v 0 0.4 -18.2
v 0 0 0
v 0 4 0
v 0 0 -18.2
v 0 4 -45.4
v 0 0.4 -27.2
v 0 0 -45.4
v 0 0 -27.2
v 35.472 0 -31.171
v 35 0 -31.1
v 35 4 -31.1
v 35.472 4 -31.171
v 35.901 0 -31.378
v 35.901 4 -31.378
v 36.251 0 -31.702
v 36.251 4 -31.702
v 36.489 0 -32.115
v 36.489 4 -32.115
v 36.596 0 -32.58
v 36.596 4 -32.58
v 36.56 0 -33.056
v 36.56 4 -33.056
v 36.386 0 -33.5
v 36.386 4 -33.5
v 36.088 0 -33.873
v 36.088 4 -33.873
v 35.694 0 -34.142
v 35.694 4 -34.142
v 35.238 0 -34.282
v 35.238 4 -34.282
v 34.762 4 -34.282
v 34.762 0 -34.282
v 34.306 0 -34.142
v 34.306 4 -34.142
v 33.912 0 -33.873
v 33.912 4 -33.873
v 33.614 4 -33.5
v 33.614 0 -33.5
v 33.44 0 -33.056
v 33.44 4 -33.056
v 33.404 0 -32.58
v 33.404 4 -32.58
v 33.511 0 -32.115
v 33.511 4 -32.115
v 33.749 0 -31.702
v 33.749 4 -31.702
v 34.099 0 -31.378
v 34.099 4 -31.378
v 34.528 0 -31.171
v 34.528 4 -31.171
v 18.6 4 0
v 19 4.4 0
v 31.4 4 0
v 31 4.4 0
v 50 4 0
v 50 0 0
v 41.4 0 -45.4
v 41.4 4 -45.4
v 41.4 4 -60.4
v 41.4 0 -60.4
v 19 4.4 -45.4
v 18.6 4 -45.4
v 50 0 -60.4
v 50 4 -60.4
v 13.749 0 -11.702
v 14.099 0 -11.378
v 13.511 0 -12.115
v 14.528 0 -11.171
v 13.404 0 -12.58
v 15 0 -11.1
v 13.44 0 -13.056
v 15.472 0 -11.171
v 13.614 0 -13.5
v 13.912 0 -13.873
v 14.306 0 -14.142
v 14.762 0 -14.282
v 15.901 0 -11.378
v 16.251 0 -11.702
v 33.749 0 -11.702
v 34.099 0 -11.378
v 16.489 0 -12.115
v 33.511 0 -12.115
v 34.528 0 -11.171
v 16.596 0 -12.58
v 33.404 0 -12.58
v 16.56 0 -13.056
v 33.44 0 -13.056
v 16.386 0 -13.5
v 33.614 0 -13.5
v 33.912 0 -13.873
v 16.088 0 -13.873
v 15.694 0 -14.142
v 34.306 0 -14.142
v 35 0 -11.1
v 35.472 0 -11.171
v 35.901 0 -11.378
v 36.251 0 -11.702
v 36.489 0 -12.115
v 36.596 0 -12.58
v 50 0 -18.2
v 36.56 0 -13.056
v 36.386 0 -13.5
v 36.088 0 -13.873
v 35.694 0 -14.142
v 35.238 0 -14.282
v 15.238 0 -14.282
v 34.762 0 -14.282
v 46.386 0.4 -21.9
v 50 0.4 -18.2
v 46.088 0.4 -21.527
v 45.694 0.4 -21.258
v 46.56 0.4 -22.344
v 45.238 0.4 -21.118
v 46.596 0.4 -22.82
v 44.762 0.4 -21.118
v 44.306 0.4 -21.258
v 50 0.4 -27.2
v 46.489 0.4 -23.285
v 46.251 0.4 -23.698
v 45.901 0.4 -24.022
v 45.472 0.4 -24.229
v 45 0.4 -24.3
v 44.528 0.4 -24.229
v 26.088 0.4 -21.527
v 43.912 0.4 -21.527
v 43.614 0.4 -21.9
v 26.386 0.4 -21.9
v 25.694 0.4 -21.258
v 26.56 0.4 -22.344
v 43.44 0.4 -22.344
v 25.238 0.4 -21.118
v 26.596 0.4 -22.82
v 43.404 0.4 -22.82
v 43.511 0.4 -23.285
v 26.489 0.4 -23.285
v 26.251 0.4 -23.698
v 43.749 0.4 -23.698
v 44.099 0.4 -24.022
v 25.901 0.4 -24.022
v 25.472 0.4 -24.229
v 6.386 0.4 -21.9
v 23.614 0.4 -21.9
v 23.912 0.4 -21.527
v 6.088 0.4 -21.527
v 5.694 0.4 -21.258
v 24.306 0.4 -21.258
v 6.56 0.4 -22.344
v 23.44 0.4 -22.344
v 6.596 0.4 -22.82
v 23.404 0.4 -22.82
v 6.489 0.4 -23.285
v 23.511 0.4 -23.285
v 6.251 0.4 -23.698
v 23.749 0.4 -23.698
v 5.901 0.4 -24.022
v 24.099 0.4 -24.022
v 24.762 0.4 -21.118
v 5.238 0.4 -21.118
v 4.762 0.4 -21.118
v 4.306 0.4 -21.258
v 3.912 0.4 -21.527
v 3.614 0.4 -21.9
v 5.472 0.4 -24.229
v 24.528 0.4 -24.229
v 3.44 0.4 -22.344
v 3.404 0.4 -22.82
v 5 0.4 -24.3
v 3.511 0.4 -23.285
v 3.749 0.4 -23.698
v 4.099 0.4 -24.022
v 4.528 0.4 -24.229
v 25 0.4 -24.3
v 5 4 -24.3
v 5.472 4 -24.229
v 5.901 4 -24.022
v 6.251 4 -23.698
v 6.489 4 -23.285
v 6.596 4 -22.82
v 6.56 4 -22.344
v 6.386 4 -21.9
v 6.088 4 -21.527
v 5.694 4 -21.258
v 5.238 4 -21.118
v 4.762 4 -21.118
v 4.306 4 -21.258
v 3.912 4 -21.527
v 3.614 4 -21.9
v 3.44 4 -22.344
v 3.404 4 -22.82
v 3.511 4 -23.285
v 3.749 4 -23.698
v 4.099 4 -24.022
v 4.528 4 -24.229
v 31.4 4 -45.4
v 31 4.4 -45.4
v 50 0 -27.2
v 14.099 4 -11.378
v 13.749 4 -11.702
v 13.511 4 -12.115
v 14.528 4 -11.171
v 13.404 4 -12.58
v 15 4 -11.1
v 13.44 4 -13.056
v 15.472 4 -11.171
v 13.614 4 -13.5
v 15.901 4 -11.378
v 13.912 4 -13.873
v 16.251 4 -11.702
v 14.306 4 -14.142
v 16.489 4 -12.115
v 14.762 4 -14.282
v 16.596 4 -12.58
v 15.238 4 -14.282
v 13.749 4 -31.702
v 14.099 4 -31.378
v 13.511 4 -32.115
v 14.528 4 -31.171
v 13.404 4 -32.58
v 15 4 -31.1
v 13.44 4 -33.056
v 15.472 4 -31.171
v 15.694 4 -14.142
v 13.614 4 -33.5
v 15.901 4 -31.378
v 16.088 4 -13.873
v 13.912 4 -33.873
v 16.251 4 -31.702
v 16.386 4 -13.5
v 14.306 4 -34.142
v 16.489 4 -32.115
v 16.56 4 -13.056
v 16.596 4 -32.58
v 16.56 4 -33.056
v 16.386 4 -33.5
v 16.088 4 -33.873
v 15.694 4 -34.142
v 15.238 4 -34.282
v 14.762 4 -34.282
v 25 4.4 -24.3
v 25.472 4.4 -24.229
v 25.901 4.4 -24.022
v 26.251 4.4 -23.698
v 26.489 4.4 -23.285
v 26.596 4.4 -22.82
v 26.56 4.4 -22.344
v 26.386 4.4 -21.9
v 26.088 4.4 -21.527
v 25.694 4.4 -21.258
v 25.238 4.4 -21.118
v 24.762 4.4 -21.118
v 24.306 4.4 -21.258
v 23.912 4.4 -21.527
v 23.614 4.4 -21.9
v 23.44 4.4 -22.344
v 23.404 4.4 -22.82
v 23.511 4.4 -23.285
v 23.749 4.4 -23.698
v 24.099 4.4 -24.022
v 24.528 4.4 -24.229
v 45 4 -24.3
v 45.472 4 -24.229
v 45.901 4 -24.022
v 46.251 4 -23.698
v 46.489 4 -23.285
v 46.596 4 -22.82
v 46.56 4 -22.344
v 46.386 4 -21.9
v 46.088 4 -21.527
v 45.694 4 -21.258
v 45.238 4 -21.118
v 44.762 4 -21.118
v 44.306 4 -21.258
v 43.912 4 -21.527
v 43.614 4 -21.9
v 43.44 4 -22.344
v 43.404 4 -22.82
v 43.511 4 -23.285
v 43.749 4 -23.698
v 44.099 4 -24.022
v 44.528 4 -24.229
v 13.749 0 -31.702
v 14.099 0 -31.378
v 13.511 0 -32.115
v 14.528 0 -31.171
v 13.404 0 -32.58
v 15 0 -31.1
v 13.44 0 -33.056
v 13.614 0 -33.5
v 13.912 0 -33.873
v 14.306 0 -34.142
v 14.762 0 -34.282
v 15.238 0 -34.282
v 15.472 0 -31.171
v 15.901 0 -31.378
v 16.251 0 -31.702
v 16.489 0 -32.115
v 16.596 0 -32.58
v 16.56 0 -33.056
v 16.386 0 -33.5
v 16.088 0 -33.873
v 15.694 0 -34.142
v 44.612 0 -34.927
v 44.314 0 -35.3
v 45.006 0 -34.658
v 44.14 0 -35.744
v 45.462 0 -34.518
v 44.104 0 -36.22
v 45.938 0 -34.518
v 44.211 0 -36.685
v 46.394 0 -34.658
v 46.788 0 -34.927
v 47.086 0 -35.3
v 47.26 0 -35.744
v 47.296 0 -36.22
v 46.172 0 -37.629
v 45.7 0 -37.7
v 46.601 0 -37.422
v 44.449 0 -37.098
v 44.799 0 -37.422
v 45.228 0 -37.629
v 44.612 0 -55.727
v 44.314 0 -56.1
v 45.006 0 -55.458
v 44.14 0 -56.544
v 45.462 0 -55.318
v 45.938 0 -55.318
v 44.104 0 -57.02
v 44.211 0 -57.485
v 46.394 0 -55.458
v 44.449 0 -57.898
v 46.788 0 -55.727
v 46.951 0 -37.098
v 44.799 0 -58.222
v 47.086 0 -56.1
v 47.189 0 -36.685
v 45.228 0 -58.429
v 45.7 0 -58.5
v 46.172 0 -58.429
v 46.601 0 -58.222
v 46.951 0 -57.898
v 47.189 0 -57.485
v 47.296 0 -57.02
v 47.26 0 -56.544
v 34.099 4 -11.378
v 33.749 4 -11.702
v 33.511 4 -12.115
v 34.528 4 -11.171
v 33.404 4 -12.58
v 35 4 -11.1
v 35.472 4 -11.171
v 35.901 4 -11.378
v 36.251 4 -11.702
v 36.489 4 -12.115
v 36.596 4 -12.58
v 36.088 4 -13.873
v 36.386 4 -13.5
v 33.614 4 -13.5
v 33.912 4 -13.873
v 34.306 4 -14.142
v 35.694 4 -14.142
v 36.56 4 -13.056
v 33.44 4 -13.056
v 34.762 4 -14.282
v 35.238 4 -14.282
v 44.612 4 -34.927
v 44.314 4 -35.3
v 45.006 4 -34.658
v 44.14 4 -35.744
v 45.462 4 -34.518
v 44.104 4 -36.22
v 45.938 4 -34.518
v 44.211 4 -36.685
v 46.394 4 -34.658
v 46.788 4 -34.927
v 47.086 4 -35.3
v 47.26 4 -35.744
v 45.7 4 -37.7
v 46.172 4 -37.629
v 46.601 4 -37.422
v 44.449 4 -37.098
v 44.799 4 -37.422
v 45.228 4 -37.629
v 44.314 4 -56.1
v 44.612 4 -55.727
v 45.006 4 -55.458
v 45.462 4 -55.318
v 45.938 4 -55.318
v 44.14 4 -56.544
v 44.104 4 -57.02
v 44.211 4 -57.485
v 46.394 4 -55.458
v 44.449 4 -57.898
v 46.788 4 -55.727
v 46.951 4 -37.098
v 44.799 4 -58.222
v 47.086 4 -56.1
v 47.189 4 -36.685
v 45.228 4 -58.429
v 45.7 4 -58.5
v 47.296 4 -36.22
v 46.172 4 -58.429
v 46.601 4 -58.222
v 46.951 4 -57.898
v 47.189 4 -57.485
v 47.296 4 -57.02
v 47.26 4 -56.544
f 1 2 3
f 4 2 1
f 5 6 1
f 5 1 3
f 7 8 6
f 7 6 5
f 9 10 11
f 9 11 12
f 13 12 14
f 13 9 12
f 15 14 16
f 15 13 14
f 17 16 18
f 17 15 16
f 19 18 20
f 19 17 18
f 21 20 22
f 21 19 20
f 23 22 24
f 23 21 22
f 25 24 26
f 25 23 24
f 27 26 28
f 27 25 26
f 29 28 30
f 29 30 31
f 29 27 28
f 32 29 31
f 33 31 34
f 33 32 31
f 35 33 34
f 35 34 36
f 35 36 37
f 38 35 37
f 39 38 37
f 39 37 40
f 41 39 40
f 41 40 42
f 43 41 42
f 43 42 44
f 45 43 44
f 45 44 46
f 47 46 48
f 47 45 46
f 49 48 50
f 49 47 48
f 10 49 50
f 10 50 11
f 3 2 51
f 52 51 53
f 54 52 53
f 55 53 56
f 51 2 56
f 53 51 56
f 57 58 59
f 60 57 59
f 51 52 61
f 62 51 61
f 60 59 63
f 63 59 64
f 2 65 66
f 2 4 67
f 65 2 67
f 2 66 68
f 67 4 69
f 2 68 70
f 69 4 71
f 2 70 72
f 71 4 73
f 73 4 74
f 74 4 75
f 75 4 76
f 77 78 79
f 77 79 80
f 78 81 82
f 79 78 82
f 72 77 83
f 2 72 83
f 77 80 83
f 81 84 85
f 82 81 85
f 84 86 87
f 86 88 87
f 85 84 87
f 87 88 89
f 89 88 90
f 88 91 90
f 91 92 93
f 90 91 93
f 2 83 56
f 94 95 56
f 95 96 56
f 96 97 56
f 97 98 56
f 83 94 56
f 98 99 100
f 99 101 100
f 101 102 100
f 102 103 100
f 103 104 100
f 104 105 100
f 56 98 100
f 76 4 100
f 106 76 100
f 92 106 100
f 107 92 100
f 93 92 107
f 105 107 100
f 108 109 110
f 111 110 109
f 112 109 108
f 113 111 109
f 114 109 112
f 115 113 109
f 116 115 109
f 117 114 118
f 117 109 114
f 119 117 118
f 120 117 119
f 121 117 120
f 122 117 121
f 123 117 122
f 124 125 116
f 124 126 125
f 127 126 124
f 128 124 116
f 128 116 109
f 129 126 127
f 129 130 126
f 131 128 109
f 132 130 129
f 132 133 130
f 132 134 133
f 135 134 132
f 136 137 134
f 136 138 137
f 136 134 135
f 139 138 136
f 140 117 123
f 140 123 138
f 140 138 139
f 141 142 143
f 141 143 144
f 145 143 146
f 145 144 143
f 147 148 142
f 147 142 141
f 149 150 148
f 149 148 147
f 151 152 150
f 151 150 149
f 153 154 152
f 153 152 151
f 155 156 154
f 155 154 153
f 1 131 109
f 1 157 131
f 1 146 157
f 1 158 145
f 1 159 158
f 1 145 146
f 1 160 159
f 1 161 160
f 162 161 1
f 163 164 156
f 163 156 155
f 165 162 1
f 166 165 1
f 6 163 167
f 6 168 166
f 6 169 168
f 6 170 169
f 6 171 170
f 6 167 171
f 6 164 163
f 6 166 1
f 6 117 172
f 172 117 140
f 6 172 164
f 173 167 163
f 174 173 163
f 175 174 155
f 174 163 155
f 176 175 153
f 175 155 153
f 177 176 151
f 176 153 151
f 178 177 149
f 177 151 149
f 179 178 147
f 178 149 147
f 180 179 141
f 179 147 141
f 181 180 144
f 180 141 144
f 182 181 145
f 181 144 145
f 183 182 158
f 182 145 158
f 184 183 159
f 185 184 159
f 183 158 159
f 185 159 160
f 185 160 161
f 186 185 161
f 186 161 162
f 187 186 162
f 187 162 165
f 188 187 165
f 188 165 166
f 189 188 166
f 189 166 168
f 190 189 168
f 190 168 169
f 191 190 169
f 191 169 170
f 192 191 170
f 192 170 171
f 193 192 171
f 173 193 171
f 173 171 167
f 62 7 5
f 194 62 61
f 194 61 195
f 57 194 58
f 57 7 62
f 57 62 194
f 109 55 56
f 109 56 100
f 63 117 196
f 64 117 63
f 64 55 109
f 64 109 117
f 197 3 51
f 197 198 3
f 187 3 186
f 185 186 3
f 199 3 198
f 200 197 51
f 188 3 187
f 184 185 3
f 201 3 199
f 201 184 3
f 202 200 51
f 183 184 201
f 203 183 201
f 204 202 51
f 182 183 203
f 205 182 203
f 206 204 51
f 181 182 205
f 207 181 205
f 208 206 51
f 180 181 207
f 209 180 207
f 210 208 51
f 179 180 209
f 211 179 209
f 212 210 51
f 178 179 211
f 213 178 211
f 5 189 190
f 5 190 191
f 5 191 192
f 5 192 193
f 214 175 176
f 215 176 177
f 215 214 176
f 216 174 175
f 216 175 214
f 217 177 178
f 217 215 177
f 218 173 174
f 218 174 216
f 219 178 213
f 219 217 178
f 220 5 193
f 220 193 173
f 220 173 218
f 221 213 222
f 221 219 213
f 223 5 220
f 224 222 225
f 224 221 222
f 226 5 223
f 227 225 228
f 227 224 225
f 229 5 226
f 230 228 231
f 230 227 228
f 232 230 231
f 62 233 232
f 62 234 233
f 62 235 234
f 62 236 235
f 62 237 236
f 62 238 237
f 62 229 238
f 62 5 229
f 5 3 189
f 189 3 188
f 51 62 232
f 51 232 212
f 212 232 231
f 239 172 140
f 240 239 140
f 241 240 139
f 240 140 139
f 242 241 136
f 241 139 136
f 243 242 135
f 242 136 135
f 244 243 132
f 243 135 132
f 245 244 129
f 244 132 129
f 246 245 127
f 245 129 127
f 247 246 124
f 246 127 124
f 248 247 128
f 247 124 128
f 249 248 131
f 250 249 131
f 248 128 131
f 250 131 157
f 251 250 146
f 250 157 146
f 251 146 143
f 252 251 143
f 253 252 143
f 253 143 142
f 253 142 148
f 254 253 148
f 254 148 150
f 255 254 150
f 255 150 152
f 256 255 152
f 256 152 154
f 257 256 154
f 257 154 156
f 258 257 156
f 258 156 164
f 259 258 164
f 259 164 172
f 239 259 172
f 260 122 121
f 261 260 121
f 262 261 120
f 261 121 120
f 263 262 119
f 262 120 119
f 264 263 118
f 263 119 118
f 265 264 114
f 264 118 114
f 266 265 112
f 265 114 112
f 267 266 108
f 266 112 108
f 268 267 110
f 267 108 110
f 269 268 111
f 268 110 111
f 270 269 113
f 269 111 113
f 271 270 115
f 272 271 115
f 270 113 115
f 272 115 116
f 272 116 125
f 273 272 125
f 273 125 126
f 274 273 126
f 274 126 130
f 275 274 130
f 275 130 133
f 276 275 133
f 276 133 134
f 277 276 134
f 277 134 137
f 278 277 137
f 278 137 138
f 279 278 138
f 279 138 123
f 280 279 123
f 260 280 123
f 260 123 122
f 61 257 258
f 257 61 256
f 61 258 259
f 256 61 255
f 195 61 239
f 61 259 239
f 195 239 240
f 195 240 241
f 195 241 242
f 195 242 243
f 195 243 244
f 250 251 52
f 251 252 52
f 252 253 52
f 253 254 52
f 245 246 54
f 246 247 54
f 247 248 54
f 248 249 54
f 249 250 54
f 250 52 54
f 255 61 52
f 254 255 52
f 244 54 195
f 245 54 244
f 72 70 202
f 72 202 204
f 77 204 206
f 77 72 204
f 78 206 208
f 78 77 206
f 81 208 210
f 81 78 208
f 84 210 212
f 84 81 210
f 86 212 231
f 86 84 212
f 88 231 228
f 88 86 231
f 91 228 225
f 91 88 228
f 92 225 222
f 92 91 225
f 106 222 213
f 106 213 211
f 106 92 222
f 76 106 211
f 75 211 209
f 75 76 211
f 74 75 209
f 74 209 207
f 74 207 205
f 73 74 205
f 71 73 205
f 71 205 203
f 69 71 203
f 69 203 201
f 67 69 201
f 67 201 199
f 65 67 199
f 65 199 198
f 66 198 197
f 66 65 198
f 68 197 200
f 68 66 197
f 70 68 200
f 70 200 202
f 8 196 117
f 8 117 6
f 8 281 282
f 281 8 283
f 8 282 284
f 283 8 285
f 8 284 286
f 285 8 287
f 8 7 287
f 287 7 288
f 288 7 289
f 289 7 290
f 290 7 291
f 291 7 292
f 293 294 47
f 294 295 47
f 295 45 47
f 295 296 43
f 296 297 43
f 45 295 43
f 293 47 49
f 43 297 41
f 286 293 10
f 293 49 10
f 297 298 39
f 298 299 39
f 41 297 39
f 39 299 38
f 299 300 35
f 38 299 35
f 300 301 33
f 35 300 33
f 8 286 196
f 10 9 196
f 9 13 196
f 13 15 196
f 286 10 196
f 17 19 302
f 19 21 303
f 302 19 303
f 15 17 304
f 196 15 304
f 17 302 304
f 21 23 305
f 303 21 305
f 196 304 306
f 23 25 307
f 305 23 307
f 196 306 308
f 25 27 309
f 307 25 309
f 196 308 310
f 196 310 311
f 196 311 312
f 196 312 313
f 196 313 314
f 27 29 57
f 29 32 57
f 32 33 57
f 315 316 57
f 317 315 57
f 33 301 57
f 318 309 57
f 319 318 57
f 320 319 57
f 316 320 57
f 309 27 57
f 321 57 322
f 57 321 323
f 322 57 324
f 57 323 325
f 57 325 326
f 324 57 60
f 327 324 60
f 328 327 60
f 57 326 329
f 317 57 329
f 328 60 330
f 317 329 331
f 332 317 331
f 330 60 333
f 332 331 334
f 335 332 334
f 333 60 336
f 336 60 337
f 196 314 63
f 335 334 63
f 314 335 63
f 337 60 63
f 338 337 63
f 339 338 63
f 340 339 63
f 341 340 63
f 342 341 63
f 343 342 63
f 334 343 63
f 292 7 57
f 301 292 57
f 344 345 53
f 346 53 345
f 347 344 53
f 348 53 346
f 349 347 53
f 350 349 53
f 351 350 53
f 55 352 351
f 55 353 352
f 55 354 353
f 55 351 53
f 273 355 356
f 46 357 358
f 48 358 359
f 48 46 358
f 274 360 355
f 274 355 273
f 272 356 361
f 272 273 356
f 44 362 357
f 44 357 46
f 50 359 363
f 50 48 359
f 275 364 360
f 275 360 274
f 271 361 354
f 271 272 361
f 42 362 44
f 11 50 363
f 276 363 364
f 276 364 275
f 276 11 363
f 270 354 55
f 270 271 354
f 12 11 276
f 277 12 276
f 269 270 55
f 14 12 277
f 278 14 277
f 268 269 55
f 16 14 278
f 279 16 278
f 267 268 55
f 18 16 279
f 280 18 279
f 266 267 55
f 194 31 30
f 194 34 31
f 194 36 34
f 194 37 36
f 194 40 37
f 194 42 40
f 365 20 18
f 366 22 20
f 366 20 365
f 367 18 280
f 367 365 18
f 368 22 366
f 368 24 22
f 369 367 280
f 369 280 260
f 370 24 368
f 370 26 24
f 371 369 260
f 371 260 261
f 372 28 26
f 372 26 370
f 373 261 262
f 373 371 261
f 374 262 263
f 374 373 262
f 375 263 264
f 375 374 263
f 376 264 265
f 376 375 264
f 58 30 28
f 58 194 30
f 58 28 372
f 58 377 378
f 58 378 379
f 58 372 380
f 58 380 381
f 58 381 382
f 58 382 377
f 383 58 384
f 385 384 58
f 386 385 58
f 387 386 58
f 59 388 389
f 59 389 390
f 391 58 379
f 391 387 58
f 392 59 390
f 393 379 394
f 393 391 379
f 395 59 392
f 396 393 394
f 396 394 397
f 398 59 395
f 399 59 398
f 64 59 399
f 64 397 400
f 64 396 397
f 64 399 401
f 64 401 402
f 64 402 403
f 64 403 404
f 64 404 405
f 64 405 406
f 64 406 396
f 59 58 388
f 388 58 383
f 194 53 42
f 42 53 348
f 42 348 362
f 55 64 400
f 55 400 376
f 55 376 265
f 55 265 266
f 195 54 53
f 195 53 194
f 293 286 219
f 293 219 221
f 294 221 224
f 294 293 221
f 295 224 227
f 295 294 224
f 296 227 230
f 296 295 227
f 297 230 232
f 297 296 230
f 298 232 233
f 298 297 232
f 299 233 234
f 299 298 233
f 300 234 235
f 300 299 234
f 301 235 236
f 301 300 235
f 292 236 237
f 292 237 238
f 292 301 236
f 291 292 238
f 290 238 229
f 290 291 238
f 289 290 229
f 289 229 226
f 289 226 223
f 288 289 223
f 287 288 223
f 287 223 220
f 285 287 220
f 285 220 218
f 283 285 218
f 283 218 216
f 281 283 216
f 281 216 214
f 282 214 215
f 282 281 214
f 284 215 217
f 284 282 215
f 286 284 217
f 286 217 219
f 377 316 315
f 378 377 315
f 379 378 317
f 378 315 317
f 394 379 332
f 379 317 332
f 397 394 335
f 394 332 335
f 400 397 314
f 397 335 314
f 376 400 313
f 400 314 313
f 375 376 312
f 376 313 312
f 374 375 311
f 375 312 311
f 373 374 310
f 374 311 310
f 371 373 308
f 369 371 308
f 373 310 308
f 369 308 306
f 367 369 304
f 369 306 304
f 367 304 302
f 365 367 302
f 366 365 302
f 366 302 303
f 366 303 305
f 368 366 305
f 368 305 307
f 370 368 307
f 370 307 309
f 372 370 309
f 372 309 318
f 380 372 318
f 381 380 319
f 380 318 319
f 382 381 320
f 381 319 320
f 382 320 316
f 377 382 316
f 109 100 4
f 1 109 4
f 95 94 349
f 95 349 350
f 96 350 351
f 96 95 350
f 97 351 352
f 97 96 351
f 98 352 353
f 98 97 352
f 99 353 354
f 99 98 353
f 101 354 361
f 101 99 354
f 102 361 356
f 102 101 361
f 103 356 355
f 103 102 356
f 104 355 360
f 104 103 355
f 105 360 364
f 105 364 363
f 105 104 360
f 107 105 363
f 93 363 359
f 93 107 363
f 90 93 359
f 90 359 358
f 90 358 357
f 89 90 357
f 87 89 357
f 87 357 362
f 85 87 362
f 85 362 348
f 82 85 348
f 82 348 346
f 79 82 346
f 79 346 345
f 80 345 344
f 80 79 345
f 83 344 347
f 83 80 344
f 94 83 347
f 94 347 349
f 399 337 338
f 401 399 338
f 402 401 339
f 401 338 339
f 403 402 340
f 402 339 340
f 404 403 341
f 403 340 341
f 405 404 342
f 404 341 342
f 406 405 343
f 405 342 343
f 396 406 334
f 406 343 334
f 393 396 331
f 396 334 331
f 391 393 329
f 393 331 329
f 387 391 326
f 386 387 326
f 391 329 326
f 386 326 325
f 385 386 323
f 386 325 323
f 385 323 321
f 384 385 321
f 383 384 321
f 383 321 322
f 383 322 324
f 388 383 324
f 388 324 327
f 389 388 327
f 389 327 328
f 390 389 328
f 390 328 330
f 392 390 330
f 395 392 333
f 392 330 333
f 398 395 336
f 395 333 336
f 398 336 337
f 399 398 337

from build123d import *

# Parameters (mm, degrees)
SKETCH_1_W          = 50
SKETCH_1_H          = 45.4
SKETCH_1_R          = 1.6
EXTRUDE_1_DEPTH     = 4
SKETCH_2_W          = 12
SKETCH_2_H          = 0.4
EXTRUDE_2_DEPTH     = 45.4
CHAMFER_1_SIZE      = 0.4
SKETCH_3_W          = 50
SKETCH_3_H          = 9
CUT_EXTRUDE_1_DEPTH = 0.4
SKETCH_4_R          = 1.6
CUT_EXTRUDE_2_DEPTH = 68.654711588
SKETCH_5_W          = 8.6
SKETCH_5_H          = 15
EXTRUDE_3_DEPTH     = 4
SKETCH_6_R          = 1.6
CUT_EXTRUDE_3_DEPTH = 4


with BuildPart() as part:
    # 草图1 → 凸台-拉伸1 (new body)
    with BuildSketch(Plane(origin=(0, 0, 0), x_dir=(1, 0, 0), z_dir=(0, 1, 0))):
        with Locations((25, 22.7)):
            Rectangle(SKETCH_1_W, SKETCH_1_H)
        with Locations(Location((15, 32.7, 0), (0, 0, 270))):
            Circle(SKETCH_1_R, mode=Mode.SUBTRACT)
        with Locations(Location((35, 32.7, 0), (0, 0, 270))):
            Circle(SKETCH_1_R, mode=Mode.SUBTRACT)
        with Locations(Location((35, 12.7, 0), (0, 0, 270))):
            Circle(SKETCH_1_R, mode=Mode.SUBTRACT)
        with Locations(Location((15, 12.7, 0), (0, 0, 270))):
            Circle(SKETCH_1_R, mode=Mode.SUBTRACT)
    extrude(amount=EXTRUDE_1_DEPTH)

    # 草图2 → 凸台-拉伸2 (add)
    with BuildSketch(Plane.XY):
        with Locations((25, 4.2)):
            Rectangle(SKETCH_2_W, SKETCH_2_H)
    extrude(amount=-EXTRUDE_2_DEPTH)

    # 倒角1
    chamfer_1_edges = [part.edges().sort_by_distance(p)[0] for p in [
        (31, 4, -22.7),
        (19, 4, -22.7),
    ]]
    chamfer(chamfer_1_edges, length=CHAMFER_1_SIZE - 0.0001)  # a hair under: the kernel refuses the full size

    # 草图3 → 切除-拉伸1 (cut)
    with BuildSketch(Plane(origin=(0, 0, 0), x_dir=(-1, 0, 0), z_dir=(0, -1, 0))):
        with Locations((-25, 22.7)):
            Rectangle(SKETCH_3_W, SKETCH_3_H)
    extrude(amount=-CUT_EXTRUDE_1_DEPTH, mode=Mode.SUBTRACT)

    # 草图4 → 切除-拉伸2 (cut, through all)
    with BuildSketch(Plane(origin=(0, 0.4, 0), x_dir=(-1, 0, 0), z_dir=(0, -1, 0))):
        with Locations(Location((-5, 22.7, 0), (0, 0, 90))):
            Circle(SKETCH_4_R)
        with Locations(Location((-25, 22.7, 0), (0, 0, 90))):
            Circle(SKETCH_4_R)
        with Locations(Location((-45, 22.7, 0), (0, 0, 90))):
            Circle(SKETCH_4_R)
    extrude(amount=-CUT_EXTRUDE_2_DEPTH, mode=Mode.SUBTRACT)

    # 草图5 → 凸台-拉伸3 (add)
    with BuildSketch(Plane(origin=(0, 4, 0), x_dir=(1, 0, 0), z_dir=(0, 1, 0))):
        with Locations((45.7, 52.9)):
            Rectangle(SKETCH_5_W, SKETCH_5_H)
    extrude(amount=-EXTRUDE_3_DEPTH)

    # 草图6 → 切除-拉伸3 (cut)
    with BuildSketch(Plane.XZ):
        with Locations(Location((45.7, -56.9, 0), (0, 0, 270))):
            Circle(SKETCH_6_R)
        with Locations(Location((45.7, -36.1, 0), (0, 0, 270))):
            Circle(SKETCH_6_R)
    extrude(amount=-CUT_EXTRUDE_3_DEPTH, mode=Mode.SUBTRACT)


solid = part.part
